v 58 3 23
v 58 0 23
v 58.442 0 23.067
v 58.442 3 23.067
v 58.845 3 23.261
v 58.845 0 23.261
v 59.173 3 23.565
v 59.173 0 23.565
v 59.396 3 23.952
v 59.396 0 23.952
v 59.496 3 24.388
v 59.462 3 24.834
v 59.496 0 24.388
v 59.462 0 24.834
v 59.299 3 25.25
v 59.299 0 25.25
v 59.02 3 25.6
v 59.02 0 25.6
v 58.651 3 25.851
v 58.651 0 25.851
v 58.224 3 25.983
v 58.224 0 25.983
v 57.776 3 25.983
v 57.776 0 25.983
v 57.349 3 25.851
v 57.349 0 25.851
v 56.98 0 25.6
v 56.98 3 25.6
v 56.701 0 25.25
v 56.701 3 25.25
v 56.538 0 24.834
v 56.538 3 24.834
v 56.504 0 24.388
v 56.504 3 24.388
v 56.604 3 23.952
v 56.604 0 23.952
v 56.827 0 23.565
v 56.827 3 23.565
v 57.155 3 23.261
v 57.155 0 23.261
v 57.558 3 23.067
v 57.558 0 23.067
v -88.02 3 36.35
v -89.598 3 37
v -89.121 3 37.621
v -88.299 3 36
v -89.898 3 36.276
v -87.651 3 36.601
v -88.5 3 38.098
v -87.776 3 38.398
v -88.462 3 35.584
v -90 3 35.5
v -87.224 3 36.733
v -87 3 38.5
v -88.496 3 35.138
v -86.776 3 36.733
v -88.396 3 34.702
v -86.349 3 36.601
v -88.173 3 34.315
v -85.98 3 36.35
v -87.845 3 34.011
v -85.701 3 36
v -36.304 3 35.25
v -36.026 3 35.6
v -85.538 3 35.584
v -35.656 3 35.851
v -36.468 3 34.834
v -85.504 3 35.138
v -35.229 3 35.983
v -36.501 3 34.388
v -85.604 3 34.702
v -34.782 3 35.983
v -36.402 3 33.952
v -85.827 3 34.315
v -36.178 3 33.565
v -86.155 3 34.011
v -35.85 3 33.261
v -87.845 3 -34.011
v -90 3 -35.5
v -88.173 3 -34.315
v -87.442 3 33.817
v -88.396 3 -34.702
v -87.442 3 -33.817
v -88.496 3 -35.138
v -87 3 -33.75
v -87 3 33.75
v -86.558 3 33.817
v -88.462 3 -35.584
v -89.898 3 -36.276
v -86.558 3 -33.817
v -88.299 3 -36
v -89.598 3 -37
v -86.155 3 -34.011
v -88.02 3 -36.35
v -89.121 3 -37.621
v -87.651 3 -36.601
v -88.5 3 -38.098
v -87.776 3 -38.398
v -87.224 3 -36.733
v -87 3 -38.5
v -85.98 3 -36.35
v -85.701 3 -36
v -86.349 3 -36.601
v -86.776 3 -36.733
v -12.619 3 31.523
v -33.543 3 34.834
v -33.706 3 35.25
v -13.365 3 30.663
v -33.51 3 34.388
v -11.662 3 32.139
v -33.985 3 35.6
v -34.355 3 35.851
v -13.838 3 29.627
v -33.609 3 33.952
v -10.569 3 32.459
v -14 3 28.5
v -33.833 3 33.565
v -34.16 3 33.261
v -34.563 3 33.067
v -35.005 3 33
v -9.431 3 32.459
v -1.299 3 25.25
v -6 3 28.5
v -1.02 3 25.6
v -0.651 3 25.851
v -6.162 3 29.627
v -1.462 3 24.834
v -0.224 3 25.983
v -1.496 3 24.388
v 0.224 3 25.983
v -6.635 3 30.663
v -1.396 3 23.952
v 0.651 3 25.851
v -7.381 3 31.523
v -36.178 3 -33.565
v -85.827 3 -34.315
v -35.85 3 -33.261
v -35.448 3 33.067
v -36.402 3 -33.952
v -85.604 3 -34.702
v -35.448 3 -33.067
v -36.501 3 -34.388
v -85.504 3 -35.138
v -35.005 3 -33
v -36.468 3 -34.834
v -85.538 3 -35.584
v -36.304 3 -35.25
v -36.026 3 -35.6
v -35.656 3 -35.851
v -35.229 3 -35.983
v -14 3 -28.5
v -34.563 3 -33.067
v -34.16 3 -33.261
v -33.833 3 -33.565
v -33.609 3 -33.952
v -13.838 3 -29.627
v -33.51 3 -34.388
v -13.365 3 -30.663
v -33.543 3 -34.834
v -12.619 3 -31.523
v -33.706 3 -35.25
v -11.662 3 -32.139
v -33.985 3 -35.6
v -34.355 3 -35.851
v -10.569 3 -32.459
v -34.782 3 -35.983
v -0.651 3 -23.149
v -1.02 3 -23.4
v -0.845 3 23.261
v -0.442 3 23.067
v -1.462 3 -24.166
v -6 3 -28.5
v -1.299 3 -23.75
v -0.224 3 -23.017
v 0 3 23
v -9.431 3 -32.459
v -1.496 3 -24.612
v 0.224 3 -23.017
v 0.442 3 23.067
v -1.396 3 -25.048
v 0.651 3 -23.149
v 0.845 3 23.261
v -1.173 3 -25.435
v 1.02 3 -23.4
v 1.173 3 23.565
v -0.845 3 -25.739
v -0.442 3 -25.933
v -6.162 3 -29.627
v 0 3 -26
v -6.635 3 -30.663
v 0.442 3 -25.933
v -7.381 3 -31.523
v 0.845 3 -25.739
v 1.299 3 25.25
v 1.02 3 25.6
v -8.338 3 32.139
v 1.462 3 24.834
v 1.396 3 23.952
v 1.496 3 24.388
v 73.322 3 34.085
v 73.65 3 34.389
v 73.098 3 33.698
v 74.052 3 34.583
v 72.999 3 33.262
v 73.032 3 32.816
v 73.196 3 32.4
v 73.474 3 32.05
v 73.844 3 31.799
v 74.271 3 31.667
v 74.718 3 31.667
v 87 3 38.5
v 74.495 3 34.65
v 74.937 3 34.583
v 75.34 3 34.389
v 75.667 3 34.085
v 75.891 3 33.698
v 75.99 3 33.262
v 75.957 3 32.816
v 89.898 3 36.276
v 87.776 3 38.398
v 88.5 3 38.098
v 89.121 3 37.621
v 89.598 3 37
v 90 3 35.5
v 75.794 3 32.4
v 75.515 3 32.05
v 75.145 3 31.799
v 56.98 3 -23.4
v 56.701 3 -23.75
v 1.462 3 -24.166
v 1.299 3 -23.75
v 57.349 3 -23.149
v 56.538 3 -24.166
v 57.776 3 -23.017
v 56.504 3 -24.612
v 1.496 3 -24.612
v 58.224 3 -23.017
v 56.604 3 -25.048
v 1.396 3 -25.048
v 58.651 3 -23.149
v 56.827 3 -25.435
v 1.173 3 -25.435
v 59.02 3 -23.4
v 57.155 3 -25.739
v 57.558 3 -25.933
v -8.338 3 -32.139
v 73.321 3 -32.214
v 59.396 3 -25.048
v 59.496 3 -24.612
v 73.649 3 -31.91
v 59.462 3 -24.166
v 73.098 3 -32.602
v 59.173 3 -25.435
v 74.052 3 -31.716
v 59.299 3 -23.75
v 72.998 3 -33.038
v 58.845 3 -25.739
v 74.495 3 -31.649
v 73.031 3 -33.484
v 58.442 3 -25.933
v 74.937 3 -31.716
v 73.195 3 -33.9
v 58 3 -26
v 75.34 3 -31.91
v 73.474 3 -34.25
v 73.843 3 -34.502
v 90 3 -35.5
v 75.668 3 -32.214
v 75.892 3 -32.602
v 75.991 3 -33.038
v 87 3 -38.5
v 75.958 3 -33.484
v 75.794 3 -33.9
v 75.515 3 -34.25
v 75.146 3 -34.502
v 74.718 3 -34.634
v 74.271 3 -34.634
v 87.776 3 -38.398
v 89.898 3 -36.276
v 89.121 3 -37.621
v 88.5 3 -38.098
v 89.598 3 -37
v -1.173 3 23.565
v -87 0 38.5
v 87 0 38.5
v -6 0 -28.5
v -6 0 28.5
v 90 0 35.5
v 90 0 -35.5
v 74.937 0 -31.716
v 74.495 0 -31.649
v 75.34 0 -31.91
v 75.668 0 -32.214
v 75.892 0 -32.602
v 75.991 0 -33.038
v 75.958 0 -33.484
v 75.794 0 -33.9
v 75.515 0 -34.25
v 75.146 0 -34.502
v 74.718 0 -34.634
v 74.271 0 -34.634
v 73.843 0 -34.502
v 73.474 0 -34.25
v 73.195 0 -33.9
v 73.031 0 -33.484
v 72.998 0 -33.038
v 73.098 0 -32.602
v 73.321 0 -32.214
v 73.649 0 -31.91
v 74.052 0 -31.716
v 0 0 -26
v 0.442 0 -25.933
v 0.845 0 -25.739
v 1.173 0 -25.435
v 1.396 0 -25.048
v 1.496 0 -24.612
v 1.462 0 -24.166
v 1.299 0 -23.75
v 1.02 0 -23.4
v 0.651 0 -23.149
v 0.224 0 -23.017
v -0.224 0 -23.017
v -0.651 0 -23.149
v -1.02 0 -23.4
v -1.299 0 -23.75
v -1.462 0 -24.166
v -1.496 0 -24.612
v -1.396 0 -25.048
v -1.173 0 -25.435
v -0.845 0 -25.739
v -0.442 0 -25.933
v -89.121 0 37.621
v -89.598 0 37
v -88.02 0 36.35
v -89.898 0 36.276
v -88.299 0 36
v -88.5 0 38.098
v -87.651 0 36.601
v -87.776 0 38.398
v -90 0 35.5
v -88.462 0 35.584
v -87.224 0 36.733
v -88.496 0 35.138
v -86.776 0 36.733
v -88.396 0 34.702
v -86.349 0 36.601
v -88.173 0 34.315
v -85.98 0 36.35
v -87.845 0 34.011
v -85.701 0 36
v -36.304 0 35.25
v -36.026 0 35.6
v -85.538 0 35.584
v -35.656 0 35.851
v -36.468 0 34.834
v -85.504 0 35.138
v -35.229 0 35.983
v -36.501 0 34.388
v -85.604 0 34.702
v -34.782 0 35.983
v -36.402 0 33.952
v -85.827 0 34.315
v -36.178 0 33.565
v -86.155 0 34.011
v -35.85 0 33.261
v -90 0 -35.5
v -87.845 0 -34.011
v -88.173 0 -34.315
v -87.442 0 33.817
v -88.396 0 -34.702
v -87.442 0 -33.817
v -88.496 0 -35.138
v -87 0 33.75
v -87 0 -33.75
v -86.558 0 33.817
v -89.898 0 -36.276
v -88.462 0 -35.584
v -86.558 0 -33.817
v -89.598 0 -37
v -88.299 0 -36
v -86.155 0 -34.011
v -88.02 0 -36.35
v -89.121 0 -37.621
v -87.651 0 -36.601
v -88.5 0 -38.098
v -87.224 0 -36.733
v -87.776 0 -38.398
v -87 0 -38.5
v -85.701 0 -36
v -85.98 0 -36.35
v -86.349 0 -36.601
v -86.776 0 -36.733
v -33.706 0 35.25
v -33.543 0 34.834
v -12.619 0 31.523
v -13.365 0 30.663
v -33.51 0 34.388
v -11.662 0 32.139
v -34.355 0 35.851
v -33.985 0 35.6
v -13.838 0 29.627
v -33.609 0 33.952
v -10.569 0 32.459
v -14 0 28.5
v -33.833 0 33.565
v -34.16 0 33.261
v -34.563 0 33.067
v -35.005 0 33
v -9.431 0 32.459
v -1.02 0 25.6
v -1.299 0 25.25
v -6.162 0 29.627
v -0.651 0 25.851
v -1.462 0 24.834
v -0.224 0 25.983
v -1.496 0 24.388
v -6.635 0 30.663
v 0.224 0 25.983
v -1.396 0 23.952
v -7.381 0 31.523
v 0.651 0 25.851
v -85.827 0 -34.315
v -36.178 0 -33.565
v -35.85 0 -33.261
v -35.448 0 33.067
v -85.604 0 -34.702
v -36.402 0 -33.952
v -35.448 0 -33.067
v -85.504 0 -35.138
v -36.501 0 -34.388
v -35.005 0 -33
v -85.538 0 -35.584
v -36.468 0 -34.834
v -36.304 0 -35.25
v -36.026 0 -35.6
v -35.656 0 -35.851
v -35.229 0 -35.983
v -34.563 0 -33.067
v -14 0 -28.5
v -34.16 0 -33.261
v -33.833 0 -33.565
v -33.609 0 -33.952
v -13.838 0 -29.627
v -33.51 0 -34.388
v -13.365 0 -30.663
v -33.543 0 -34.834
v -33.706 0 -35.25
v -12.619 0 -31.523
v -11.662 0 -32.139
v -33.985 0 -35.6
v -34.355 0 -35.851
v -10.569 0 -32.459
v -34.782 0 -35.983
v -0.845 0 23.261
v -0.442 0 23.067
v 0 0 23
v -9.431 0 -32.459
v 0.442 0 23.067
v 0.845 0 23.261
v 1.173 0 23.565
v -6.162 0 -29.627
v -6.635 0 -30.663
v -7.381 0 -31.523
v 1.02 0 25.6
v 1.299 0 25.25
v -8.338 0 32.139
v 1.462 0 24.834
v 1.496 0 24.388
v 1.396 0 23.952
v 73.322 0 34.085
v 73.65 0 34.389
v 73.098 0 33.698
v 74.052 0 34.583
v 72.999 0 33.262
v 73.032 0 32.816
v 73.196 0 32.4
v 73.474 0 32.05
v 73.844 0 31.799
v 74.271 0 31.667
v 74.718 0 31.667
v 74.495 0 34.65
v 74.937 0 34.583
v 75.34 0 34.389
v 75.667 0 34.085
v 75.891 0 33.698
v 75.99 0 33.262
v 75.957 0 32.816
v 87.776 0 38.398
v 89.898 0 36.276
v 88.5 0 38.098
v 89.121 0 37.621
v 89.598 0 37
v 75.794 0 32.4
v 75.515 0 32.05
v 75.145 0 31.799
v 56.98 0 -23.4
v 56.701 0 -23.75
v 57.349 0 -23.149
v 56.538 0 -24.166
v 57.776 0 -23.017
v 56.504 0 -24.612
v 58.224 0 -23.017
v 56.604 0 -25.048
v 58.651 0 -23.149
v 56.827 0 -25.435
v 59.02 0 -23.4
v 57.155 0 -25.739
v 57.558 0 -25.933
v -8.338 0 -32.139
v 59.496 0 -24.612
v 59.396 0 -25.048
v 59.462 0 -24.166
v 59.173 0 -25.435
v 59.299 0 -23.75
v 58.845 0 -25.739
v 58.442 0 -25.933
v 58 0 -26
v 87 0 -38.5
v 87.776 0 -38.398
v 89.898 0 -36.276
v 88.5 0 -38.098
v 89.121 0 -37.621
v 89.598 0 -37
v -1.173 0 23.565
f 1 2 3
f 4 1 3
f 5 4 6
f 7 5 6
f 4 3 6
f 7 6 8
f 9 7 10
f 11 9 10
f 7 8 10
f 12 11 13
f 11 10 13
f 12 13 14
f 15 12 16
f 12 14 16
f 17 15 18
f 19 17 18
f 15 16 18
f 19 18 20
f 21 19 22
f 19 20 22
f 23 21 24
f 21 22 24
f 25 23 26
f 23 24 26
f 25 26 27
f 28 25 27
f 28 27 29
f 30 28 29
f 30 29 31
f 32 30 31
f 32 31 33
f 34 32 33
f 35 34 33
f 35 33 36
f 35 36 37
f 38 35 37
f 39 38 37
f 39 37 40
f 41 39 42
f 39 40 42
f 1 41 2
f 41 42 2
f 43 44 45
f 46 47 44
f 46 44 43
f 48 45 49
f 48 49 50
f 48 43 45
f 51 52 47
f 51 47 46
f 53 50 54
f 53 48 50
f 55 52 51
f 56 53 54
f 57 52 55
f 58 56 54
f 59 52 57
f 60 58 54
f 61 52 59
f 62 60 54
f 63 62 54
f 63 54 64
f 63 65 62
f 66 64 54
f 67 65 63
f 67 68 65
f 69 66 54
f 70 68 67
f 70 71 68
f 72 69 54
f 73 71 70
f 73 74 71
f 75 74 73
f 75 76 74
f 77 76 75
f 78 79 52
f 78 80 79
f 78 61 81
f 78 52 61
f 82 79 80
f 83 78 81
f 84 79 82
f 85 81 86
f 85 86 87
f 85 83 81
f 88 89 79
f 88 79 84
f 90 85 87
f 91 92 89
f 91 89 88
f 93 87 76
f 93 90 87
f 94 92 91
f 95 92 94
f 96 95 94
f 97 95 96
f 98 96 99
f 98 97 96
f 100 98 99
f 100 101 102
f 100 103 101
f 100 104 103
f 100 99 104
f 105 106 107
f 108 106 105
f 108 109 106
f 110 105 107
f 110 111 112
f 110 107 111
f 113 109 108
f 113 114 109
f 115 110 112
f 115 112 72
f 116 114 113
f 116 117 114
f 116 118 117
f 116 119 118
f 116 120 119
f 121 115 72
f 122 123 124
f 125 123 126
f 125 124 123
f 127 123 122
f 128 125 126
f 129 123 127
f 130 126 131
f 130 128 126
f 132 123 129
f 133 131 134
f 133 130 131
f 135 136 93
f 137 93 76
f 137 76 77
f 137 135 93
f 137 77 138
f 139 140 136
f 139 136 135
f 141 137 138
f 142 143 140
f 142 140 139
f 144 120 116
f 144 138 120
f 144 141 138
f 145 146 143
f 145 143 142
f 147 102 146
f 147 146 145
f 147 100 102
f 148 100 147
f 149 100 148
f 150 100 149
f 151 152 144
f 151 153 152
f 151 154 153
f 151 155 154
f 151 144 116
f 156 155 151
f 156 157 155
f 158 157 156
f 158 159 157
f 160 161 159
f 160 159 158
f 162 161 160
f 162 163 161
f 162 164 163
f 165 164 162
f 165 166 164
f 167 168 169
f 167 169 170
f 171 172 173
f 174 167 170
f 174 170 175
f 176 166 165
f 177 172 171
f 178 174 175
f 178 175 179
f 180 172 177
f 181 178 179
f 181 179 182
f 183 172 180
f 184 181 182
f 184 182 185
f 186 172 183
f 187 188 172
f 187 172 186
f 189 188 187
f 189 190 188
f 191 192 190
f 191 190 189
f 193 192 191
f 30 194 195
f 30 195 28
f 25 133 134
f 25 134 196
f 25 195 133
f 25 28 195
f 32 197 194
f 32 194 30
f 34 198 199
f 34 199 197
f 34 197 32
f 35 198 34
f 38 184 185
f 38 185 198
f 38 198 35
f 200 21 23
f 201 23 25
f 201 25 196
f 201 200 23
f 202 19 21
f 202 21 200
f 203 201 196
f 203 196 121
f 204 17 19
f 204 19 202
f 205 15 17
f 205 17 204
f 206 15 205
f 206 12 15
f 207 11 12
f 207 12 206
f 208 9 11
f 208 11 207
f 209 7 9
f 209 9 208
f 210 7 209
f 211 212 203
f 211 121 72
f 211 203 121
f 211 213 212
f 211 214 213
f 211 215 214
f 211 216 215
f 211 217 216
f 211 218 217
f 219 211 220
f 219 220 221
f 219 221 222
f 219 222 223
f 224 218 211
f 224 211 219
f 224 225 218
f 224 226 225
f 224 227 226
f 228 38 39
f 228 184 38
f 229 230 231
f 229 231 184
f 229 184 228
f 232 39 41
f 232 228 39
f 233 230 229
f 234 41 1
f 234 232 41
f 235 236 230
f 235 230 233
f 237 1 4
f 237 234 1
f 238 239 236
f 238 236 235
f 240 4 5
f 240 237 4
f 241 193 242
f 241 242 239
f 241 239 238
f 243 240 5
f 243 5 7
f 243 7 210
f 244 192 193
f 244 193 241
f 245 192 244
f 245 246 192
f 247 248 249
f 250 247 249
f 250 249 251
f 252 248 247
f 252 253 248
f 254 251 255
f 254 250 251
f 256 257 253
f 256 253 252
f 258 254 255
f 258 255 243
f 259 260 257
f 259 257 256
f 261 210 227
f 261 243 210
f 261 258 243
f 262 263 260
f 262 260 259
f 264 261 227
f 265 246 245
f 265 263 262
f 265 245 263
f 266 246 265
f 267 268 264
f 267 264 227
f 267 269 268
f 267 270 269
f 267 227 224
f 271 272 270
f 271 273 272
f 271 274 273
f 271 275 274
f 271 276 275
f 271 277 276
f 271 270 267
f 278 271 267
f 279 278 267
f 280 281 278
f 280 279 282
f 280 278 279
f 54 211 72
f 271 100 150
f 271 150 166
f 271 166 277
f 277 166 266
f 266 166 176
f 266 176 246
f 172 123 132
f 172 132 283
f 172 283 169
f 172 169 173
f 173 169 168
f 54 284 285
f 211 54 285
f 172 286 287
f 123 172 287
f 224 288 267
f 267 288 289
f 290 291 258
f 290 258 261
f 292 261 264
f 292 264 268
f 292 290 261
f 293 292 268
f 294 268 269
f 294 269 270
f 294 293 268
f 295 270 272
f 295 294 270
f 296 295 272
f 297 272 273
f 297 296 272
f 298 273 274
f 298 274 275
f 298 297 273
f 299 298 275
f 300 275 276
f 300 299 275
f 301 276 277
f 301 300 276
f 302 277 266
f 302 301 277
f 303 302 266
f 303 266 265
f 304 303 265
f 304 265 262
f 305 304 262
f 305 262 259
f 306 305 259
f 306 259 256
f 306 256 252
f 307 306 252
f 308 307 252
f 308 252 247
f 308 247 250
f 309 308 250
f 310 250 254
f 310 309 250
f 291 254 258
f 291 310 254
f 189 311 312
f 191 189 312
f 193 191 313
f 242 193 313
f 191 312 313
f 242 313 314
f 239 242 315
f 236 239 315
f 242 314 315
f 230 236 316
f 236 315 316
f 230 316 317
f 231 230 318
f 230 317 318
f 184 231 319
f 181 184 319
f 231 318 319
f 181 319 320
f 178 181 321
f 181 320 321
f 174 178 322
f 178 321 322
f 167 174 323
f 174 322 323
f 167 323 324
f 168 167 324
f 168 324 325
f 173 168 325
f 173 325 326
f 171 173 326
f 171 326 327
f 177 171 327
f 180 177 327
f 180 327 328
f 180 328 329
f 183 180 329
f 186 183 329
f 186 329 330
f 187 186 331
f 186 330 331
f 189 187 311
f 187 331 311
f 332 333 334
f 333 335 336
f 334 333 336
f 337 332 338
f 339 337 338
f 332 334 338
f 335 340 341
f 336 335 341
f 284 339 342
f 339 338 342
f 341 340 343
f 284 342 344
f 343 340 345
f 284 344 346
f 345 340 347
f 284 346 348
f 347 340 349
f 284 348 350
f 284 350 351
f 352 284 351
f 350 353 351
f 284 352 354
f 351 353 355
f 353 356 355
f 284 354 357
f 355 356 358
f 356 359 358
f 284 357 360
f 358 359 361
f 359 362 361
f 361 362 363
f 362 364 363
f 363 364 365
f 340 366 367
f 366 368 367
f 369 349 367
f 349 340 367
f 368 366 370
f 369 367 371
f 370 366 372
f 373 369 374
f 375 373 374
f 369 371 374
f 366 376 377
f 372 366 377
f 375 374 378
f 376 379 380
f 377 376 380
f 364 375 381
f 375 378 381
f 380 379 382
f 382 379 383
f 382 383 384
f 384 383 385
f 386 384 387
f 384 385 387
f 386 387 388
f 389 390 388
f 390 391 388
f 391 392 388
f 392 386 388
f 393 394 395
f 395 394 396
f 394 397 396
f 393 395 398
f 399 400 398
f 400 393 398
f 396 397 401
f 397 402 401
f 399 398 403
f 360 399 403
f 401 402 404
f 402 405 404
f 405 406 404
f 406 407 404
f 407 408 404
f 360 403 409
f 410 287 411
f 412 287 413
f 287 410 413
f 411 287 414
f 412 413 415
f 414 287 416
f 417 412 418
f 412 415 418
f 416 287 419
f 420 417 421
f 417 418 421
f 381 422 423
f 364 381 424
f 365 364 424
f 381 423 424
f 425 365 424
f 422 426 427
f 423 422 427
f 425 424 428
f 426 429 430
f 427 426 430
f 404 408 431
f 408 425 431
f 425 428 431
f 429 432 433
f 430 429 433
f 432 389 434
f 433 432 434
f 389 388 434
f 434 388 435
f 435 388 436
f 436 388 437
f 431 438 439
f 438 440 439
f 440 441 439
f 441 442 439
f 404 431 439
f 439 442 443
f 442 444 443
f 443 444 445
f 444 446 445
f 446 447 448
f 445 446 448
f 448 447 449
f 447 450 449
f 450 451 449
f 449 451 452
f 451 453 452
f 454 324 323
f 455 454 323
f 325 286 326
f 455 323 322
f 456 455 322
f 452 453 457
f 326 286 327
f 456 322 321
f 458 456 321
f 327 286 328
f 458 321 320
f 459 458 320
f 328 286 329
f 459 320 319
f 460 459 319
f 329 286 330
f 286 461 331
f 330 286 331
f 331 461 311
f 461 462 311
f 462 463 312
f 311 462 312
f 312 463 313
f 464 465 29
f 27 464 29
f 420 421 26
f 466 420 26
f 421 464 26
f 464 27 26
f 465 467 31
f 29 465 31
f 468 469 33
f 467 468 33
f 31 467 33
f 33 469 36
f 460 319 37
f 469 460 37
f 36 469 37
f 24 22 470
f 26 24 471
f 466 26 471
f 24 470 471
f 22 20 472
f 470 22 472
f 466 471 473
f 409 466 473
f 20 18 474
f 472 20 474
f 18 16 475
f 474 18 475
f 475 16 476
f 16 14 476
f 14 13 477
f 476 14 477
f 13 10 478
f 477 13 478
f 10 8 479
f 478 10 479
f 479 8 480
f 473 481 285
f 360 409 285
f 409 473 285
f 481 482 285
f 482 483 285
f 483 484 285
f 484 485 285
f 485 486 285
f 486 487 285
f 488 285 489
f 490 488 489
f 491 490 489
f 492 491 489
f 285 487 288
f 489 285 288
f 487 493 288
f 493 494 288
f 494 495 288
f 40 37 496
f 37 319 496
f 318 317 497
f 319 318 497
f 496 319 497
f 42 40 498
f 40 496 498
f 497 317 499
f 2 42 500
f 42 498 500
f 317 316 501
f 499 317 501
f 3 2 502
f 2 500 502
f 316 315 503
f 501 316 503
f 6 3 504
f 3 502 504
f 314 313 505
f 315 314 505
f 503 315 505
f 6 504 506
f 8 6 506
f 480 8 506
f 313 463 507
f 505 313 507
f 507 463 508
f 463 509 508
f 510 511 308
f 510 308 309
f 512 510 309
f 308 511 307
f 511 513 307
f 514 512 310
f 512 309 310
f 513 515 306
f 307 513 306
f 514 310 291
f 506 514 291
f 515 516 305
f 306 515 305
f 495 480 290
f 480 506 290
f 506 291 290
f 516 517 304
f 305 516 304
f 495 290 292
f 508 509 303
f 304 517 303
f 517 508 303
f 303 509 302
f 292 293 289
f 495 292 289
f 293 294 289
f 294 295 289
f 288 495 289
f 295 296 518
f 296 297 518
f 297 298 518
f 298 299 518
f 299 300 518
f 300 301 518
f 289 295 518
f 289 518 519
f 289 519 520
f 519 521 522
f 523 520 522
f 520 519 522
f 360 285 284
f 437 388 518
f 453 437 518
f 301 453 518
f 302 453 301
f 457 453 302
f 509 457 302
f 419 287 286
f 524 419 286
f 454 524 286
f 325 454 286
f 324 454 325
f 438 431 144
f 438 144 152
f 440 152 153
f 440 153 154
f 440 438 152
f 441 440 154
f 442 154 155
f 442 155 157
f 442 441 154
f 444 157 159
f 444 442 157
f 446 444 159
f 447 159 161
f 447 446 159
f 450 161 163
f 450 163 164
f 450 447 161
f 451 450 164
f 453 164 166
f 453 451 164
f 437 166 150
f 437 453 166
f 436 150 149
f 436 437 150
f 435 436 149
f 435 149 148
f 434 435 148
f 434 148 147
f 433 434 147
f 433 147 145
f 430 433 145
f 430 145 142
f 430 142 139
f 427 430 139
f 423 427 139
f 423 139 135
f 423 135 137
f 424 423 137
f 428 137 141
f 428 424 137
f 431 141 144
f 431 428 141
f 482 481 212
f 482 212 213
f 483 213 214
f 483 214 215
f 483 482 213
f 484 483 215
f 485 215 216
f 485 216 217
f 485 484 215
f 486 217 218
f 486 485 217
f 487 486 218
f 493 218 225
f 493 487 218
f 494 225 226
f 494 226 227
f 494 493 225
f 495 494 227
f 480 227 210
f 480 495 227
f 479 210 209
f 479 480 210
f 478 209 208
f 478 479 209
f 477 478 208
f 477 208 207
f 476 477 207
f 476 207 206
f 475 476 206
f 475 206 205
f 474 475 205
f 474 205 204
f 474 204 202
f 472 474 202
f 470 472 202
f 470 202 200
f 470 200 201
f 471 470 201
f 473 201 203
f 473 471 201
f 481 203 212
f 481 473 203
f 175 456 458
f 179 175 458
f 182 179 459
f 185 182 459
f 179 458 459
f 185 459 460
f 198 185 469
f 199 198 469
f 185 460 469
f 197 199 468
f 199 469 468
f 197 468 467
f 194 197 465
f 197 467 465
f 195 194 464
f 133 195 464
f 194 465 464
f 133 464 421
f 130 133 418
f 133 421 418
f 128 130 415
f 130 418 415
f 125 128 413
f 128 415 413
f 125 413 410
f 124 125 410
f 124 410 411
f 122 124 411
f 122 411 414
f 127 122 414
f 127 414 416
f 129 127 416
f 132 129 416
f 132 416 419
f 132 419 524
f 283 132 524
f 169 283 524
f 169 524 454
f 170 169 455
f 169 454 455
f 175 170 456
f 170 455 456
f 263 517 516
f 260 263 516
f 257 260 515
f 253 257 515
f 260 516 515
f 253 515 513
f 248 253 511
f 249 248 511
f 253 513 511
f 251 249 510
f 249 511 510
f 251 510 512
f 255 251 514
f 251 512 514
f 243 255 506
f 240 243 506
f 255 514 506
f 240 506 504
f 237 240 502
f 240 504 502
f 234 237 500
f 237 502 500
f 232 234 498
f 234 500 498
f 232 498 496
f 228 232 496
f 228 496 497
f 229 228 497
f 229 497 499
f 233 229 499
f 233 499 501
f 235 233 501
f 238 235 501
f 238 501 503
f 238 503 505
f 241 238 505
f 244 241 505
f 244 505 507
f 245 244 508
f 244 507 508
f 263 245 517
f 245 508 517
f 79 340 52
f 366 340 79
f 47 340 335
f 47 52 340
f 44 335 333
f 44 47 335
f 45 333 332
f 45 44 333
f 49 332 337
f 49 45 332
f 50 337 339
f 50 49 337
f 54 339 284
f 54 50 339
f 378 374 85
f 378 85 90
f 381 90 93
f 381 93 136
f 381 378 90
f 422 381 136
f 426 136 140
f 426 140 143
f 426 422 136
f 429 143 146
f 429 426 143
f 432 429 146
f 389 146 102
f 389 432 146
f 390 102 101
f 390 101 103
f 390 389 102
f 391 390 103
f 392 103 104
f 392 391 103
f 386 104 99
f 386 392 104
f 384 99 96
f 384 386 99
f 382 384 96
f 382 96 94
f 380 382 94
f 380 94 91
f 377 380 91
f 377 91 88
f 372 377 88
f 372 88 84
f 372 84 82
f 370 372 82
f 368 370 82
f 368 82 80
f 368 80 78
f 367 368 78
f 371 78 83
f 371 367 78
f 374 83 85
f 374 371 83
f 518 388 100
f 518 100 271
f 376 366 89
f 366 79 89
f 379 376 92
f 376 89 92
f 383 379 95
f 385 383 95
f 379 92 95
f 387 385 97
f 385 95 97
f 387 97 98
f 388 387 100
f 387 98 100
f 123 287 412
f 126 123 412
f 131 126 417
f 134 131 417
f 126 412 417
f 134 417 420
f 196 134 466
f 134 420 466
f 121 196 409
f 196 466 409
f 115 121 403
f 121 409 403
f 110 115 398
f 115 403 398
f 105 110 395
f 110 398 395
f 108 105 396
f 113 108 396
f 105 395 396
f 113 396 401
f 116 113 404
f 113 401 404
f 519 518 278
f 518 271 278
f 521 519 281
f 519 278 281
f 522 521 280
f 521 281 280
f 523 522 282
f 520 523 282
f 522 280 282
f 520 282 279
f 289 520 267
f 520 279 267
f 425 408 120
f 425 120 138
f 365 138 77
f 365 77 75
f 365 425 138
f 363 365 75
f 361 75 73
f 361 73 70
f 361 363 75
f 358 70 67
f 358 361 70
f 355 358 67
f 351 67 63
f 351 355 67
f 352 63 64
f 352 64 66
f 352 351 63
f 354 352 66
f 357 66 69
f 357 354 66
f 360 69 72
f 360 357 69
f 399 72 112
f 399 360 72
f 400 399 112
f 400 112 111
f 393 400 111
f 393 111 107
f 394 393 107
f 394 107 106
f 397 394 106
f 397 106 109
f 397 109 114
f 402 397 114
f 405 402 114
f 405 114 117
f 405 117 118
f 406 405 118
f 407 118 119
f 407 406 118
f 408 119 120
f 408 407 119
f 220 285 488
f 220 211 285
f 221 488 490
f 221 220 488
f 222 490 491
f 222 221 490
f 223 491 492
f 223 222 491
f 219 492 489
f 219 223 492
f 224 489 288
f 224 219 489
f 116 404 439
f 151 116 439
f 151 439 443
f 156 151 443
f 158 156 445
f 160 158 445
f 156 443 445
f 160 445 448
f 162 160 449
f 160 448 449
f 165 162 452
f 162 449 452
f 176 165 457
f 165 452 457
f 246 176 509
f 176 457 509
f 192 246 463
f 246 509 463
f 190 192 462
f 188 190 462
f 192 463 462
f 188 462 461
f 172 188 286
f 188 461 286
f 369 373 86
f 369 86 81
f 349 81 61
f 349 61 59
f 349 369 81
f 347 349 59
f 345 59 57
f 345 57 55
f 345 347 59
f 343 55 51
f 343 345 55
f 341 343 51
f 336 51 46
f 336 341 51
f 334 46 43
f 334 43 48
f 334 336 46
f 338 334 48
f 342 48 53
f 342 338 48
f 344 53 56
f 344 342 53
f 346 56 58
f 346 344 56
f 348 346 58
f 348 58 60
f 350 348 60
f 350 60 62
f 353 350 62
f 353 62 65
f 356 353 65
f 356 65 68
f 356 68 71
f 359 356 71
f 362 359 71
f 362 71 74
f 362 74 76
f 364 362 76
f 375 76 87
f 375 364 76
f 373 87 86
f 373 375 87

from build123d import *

# Parameters (mm, degrees)
SKETCH1_W           = 180
SKETCH1_H           = 77
SKETCH1_R           = 1.5
SKETCH1_R_2         = 1.500742376
BOSS_EXTRUDE1_DEPTH = 3
FILLET1_R           = 3
SKETCH2_R           = 1.5
CUT_EXTRUDE1_DEPTH  = 3


with BuildPart() as part:
    # Sketch1 → Boss-Extrude1 (new body)
    with BuildSketch(Plane(origin=(0, 0, 0), x_dir=(1, 0, 0), z_dir=(0, 1, 0))):
        Rectangle(SKETCH1_W, SKETCH1_H)
        with Locations(Location((-87, 35.25, 0), (0, 0, 270))):
            Circle(SKETCH1_R, mode=Mode.SUBTRACT)
        with Locations(Location((-87, -35.25, 0), (0, 0, 90))):
            Circle(SKETCH1_R, mode=Mode.SUBTRACT)
        with Locations(Location((-35.005408935, 34.5, 0), (0, 0, 270))):
            Circle(SKETCH1_R, mode=Mode.SUBTRACT)
        with Locations(Location((-35.005408935, -34.5, 0), (0, 0, 90))):
            Circle(SKETCH1_R, mode=Mode.SUBTRACT)
        with Locations(Location((74.494591065, 33.15, 0), (0, 0, 270))):
            Circle(SKETCH1_R_2, mode=Mode.SUBTRACT)
        with Locations(Location((74.494591065, -33.15, 0), (0, 0, 270))):
            Circle(SKETCH1_R, mode=Mode.SUBTRACT)
    extrude(amount=BOSS_EXTRUDE1_DEPTH)

    # Fillet1
    fillet1_edges = [part.edges().sort_by_distance(p)[0] for p in [
        (90, 1.5, 38.5),
        (-90, 1.5, 38.5),
        (-90, 1.5, -38.5),
        (90, 1.5, -38.5),
    ]]
    fillet(fillet1_edges, radius=FILLET1_R)

    # Sketch2 → Cut-Extrude1 (cut)
    with BuildSketch(Plane.XZ):
        with Locations(Location((58, 24.5, 0), (0, 0, 270))):
            Circle(SKETCH2_R)
        with Locations(Location((58, -24.5, 0), (0, 0, 270))):
            Circle(SKETCH2_R)
        with Locations(Location((0, -24.5, 0), (0, 0, 270))):
            Circle(SKETCH2_R)
        with Locations(Location((0, 24.5, 0), (0, 0, 270))):
            Circle(SKETCH2_R)
        with BuildLine():
            Line((-14, 28.5), (-14, -28.5))
            ThreePointArc((-14, -28.5), (-10, -32.5), (-6, -28.5))
            Line((-6, -28.5), (-6, 28.5))
            ThreePointArc((-6, 28.5), (-10, 32.5), (-14, 28.5))
        make_face()
    extrude(amount=-CUT_EXTRUDE1_DEPTH, mode=Mode.SUBTRACT)


solid = part.part
